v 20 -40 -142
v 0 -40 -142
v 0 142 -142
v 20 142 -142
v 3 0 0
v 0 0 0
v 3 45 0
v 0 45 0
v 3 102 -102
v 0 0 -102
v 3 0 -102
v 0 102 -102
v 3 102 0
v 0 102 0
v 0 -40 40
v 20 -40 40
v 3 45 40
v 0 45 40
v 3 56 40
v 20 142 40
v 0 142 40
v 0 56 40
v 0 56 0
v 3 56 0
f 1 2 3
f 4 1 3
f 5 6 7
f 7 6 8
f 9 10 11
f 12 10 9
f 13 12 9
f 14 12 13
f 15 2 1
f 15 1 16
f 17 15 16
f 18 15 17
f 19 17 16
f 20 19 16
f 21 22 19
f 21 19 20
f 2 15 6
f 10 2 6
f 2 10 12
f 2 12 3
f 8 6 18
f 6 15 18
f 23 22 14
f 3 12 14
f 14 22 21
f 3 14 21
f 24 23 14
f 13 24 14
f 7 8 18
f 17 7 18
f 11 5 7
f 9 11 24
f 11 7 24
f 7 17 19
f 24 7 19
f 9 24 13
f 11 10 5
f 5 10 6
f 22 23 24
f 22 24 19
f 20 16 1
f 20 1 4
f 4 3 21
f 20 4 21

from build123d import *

# Parameters (mm, degrees)
F0_W     = 182
F0_H     = 182
F0_W_2   = 102
F0_H_2   = 102
F1_DEPTH = 20
F2_DEPTH = 3
F3_W     = 11
F3_H     = 40
F4_DEPTH = 3


with BuildPart() as f1:
    # F0 (on Right) → F1 (new body)
    with BuildSketch(Plane.YZ):
        with Locations((51, -51)):
            Rectangle(F0_W, F0_H)
        with Locations((51, -51)):
            Rectangle(F0_W_2, F0_H_2, mode=Mode.SUBTRACT)
        with Locations((51, -51)):
            Rectangle(F0_W_2, F0_H_2)
    extrude(amount=F1_DEPTH)

    # F0 (on Right) → F2 (cut)
    with BuildSketch(Plane.YZ):
        with Locations((51, -51)):
            Rectangle(F0_W_2, F0_H_2)
    extrude(amount=F2_DEPTH, mode=Mode.SUBTRACT)

    # F3 (on face) → F4 (cut)
    with BuildSketch(Plane.YZ):
        with Locations((50.5, 20)):
            Rectangle(F3_W, F3_H)
    extrude(amount=F4_DEPTH, mode=Mode.SUBTRACT)


solid = f1.part
